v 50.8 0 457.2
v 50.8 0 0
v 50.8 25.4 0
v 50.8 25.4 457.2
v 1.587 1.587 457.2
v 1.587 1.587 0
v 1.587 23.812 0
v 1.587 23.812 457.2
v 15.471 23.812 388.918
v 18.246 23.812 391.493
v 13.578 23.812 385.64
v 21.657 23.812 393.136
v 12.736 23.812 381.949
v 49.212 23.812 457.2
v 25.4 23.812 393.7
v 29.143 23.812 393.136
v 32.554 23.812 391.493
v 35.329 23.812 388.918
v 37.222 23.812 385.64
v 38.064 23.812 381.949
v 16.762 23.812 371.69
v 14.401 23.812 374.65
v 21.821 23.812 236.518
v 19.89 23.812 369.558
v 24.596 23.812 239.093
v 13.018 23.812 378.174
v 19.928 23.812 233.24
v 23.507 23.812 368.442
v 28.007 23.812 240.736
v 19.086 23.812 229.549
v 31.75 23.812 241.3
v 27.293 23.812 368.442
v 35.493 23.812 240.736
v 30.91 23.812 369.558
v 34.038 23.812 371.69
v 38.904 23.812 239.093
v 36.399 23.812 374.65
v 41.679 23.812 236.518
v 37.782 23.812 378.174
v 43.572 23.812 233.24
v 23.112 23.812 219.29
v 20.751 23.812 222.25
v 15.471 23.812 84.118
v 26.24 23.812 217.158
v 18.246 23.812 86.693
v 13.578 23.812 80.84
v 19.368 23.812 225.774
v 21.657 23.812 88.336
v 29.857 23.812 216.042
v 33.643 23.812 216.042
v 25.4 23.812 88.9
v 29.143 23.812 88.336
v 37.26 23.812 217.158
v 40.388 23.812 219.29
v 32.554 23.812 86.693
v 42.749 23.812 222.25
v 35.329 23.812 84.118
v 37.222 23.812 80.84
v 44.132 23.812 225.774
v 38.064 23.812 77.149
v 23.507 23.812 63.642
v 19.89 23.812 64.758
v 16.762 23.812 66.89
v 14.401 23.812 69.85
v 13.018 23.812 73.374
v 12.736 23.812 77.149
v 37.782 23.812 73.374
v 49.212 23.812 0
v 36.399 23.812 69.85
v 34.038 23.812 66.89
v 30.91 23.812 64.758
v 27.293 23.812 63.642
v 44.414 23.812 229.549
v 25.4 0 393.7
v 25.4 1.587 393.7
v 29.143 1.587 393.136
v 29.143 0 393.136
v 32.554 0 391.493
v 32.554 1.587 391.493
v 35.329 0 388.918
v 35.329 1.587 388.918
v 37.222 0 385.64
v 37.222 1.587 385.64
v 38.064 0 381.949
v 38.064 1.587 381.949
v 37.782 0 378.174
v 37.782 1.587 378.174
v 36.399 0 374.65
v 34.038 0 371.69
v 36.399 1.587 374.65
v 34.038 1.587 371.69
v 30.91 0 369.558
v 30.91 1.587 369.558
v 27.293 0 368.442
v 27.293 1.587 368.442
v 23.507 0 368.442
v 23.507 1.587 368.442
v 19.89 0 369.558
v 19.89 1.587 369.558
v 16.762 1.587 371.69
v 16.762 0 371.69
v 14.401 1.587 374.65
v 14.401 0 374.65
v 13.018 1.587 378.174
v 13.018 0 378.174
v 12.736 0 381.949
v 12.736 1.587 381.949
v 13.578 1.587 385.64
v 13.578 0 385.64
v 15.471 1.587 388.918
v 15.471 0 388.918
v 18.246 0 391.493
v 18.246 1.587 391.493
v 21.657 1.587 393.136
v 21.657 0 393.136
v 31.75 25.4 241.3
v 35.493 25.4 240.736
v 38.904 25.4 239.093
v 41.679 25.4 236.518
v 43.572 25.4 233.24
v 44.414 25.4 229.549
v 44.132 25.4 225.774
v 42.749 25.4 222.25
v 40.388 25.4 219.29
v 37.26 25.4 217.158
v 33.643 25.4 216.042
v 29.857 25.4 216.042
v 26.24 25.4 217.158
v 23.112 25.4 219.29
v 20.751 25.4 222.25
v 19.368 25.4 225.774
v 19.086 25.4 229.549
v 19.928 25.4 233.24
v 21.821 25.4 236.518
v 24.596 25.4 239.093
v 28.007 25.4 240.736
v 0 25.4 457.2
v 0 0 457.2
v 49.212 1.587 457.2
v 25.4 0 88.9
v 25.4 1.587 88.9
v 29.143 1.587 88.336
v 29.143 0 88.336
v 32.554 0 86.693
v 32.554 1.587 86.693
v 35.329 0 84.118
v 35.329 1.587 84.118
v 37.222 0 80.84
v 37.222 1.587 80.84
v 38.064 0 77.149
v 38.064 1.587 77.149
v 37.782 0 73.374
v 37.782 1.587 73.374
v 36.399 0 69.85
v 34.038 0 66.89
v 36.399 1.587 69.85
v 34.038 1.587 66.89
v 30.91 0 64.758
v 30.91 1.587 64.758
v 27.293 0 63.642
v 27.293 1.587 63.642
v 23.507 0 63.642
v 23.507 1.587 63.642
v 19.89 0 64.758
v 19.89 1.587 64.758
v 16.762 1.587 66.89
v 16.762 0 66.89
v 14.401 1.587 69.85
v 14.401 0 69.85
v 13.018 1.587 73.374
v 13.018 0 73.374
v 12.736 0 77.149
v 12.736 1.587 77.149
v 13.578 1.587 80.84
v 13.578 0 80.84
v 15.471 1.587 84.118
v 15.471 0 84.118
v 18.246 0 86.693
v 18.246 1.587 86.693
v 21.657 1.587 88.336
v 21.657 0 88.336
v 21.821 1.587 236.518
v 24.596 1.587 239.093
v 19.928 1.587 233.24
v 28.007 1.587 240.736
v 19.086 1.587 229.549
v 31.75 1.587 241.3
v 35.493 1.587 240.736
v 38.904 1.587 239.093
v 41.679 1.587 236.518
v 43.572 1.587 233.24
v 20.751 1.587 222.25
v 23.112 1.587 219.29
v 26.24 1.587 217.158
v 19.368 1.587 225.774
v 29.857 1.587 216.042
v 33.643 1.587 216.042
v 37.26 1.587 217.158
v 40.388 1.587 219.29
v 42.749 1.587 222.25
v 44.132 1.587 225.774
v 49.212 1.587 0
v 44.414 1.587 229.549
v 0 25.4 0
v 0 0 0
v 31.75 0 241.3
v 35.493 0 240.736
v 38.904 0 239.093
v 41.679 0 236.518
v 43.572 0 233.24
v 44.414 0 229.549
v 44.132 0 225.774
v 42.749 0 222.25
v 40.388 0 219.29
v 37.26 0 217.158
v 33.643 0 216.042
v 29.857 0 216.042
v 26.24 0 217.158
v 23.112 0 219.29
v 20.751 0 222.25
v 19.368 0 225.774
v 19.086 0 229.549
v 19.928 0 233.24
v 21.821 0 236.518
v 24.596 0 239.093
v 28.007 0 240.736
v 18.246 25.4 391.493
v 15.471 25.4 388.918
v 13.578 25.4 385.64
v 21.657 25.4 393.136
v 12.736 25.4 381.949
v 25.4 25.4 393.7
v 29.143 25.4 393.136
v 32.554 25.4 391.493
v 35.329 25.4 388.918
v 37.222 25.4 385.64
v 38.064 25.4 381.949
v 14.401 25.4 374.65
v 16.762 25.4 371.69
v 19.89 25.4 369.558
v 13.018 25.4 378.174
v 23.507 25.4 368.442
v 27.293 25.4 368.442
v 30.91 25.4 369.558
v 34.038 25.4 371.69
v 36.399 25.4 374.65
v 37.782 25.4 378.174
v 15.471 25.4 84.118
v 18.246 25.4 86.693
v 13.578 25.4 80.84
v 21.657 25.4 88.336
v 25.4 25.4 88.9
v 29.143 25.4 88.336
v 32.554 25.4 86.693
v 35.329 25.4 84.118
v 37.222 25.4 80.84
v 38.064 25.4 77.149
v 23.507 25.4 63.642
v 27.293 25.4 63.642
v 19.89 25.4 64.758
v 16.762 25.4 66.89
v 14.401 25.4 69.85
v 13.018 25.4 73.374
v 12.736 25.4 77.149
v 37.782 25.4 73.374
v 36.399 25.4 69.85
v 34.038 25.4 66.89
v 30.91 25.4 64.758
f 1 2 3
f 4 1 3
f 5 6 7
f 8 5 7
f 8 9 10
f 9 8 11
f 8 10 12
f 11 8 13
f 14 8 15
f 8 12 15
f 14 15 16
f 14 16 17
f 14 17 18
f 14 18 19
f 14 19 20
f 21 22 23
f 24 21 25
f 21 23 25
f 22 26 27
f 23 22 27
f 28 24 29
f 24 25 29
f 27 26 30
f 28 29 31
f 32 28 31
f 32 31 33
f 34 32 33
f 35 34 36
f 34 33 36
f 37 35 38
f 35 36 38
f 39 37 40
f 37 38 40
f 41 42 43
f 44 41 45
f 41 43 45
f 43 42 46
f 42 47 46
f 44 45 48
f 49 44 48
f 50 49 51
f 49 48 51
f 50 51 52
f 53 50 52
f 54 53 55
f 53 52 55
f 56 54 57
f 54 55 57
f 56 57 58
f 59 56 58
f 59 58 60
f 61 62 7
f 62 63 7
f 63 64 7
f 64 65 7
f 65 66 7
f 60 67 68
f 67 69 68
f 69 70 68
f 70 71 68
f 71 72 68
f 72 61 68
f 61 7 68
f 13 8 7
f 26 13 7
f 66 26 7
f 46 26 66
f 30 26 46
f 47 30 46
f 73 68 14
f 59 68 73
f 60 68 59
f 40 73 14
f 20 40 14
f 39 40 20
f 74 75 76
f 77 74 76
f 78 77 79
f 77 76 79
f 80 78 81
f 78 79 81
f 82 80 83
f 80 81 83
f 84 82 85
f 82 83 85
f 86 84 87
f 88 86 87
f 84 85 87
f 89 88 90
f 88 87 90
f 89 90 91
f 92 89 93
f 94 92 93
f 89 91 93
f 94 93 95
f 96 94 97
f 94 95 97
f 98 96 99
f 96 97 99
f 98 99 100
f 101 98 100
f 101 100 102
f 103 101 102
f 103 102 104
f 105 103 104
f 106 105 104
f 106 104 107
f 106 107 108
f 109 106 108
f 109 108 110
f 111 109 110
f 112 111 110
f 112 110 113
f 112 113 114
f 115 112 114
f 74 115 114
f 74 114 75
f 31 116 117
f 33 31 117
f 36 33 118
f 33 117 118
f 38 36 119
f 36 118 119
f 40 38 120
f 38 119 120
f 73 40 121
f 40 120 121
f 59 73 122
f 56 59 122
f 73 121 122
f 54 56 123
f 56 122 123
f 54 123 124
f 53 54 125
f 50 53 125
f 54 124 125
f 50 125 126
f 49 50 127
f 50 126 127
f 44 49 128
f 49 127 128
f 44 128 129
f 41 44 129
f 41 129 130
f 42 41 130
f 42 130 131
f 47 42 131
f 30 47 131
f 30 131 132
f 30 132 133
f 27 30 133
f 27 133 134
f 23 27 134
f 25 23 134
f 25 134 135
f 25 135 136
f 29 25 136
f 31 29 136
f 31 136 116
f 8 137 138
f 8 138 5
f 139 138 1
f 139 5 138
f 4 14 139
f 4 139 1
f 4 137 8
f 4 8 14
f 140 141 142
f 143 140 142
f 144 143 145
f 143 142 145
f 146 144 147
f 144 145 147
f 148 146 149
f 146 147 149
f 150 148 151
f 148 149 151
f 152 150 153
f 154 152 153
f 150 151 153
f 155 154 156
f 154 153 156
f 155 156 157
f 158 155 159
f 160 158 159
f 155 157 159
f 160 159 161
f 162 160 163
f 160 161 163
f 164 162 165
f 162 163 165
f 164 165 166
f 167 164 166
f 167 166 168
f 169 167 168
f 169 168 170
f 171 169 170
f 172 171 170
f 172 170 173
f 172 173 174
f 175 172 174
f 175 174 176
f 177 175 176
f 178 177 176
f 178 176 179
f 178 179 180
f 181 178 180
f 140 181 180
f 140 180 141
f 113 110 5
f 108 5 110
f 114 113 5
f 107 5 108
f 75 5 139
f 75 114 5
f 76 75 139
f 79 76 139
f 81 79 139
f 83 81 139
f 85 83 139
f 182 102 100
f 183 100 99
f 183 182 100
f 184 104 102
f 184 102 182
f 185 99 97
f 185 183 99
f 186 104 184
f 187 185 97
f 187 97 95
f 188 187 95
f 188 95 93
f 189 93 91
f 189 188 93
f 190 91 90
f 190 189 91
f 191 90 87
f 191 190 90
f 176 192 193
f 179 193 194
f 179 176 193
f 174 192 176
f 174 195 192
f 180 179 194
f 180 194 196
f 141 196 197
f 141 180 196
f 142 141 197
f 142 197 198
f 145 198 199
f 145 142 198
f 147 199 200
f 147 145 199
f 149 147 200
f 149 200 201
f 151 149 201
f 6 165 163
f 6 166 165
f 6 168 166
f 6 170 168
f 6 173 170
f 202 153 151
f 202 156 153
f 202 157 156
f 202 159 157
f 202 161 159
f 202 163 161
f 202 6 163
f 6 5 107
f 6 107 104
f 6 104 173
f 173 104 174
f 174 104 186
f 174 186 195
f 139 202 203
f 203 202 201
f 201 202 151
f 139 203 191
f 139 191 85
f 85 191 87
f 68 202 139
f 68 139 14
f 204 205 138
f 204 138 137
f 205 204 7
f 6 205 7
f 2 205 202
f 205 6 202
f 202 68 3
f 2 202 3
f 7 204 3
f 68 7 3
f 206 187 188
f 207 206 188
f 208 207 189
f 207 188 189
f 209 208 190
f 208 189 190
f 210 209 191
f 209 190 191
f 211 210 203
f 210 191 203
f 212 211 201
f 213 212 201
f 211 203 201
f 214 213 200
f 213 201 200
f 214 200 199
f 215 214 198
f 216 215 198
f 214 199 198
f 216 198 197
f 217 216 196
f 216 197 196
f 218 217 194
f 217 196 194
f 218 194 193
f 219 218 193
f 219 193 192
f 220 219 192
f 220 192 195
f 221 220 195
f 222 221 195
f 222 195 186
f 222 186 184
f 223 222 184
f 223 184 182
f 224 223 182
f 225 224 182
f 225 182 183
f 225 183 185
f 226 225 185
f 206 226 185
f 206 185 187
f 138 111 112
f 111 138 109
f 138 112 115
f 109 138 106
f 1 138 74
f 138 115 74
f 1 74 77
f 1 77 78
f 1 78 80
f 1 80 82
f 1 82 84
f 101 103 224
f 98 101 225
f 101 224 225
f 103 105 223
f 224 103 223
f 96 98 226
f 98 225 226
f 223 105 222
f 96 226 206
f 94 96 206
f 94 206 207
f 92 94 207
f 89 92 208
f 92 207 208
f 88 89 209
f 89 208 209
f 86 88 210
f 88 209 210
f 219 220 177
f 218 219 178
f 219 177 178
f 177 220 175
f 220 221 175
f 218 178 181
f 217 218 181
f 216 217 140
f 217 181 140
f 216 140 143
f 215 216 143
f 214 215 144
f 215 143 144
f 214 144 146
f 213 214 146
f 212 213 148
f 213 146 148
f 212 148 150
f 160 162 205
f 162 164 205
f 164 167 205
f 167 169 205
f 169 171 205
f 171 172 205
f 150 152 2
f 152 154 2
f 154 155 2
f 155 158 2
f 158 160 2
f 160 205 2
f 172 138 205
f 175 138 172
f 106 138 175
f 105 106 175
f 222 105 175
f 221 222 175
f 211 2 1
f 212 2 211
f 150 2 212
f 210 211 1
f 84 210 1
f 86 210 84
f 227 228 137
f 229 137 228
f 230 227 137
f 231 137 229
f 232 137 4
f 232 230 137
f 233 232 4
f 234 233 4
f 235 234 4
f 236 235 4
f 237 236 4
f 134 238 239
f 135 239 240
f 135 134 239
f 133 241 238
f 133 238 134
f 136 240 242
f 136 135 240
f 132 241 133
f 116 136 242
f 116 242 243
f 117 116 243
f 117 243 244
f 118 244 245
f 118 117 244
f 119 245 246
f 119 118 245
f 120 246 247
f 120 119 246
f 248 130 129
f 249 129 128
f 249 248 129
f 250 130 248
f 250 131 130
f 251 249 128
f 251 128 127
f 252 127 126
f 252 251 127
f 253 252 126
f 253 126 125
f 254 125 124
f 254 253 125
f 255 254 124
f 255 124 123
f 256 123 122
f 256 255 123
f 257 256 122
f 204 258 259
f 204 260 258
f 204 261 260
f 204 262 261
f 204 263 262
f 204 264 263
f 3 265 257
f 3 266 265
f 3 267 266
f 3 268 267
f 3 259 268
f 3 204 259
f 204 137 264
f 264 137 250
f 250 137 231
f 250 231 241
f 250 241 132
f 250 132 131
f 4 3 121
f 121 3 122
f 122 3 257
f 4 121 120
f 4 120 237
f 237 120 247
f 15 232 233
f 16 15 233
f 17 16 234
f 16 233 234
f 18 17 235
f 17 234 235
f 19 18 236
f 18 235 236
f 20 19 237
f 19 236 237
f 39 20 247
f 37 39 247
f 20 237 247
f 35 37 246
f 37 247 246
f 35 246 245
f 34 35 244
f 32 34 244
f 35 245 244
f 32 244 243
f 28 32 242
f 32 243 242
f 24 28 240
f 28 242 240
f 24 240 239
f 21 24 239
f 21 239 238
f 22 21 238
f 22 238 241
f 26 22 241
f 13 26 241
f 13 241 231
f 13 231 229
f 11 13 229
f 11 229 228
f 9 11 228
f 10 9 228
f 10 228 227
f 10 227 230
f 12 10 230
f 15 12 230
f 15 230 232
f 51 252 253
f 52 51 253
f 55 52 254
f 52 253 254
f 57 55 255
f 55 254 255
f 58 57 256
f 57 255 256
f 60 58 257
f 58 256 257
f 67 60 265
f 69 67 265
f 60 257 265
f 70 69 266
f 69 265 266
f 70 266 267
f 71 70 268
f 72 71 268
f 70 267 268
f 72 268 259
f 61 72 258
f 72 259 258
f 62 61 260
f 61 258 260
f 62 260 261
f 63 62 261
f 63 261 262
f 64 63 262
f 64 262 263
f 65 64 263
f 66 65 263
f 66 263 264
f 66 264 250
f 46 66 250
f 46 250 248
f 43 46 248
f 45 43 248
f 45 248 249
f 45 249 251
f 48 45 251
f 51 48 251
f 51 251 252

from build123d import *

# Parameters (mm, degrees)
SKETCH1_W           = 50.8
SKETCH1_H           = 25.4
SKETCH1_W_2         = 47.625
SKETCH1_H_2         = 22.225
BOSS_EXTRUDE1_DEPTH = 457.2
SKETCH2_R           = 12.7
CUT_EXTRUDE1_DEPTH  = 25.4
SKETCH4_R           = 12.7
CUT_EXTRUDE2_DEPTH  = 25.4
SKETCH5_R           = 12.7
CUT_EXTRUDE5_DEPTH  = 25.4


with BuildPart() as part:
    # Sketch1 → Boss-Extrude1 (new body)
    with BuildSketch(Plane.XY):
        with Locations((25.4, 12.7)):
            Rectangle(SKETCH1_W, SKETCH1_H)
        with Locations((25.4, 12.7)):
            Rectangle(SKETCH1_W_2, SKETCH1_H_2, mode=Mode.SUBTRACT)
    extrude(amount=BOSS_EXTRUDE1_DEPTH)

    # Sketch2 → Cut-Extrude1 (cut)
    with BuildSketch(Plane(origin=(0, 25.4, 0), x_dir=(1, 0, 0), z_dir=(0, 1, 0))):
        with Locations(Location((25.4, -381, 0), (0, 0, 270))):
            Circle(SKETCH2_R)
    extrude(amount=-CUT_EXTRUDE1_DEPTH, mode=Mode.SUBTRACT)

    # Sketch4 → Cut-Extrude2 (cut)
    with BuildSketch(Plane(origin=(0, 25.4, 0), x_dir=(1, 0, 0), z_dir=(0, 1, 0))):
        with Locations(Location((25.4, -76.2, 0), (0, 0, 270))):
            Circle(SKETCH4_R)
    extrude(amount=-CUT_EXTRUDE2_DEPTH, mode=Mode.SUBTRACT)

    # Sketch5 → Cut-Extrude5 (cut)
    with BuildSketch(Plane(origin=(0, 25.4, 0), x_dir=(1, 0, 0), z_dir=(0, 1, 0))):
        with Locations(Location((31.75, -228.6, 0), (0, 0, 270))):
            Circle(SKETCH5_R)
    extrude(amount=-CUT_EXTRUDE5_DEPTH, mode=Mode.SUBTRACT)


solid = part.part
